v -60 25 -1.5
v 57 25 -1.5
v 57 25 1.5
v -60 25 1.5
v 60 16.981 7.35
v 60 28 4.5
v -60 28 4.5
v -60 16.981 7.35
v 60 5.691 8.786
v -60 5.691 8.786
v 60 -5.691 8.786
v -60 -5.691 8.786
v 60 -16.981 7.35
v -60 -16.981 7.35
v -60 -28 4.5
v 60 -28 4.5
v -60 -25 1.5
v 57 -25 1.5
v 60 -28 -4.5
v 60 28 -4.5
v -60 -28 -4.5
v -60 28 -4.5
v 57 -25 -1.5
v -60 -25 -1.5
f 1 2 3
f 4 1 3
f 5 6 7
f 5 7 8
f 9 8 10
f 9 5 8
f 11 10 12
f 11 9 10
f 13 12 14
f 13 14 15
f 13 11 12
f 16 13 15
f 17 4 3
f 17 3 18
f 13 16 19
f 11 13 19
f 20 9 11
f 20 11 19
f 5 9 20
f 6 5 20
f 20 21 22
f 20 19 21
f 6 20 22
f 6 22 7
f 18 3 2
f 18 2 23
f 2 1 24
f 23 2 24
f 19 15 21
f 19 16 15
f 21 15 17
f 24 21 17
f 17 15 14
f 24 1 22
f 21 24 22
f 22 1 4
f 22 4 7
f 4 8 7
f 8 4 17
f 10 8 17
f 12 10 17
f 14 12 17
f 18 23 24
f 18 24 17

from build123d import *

# Parameters (mm, degrees)
F1_DEPTH = 60
F2_W     = 50
F2_H     = 3
F3_DEPTH = 117


with BuildPart() as f1:
    # F0 (on Right) → F1 (new body, symmetric)
    with BuildSketch(Plane.YZ):
        with BuildLine():
            Line((-28, -4.5), (28, -4.5))
            Line((28, -4.5), (28, 4.5))
            ThreePointArc((28, 4.5), (0, 8.966381), (-28, 4.5))
            Line((-28, 4.5), (-28, -4.5))
        make_face()
    extrude(amount=F1_DEPTH, both=True)

    # F2 (on face) → F3 (cut)
    with BuildSketch(Plane(origin=(-60, 0, 0), x_dir=(0, -1, 0), z_dir=(-1, 0, 0))):
        Rectangle(F2_W, F2_H)
    extrude(amount=-F3_DEPTH, mode=Mode.SUBTRACT)


solid = f1.part
